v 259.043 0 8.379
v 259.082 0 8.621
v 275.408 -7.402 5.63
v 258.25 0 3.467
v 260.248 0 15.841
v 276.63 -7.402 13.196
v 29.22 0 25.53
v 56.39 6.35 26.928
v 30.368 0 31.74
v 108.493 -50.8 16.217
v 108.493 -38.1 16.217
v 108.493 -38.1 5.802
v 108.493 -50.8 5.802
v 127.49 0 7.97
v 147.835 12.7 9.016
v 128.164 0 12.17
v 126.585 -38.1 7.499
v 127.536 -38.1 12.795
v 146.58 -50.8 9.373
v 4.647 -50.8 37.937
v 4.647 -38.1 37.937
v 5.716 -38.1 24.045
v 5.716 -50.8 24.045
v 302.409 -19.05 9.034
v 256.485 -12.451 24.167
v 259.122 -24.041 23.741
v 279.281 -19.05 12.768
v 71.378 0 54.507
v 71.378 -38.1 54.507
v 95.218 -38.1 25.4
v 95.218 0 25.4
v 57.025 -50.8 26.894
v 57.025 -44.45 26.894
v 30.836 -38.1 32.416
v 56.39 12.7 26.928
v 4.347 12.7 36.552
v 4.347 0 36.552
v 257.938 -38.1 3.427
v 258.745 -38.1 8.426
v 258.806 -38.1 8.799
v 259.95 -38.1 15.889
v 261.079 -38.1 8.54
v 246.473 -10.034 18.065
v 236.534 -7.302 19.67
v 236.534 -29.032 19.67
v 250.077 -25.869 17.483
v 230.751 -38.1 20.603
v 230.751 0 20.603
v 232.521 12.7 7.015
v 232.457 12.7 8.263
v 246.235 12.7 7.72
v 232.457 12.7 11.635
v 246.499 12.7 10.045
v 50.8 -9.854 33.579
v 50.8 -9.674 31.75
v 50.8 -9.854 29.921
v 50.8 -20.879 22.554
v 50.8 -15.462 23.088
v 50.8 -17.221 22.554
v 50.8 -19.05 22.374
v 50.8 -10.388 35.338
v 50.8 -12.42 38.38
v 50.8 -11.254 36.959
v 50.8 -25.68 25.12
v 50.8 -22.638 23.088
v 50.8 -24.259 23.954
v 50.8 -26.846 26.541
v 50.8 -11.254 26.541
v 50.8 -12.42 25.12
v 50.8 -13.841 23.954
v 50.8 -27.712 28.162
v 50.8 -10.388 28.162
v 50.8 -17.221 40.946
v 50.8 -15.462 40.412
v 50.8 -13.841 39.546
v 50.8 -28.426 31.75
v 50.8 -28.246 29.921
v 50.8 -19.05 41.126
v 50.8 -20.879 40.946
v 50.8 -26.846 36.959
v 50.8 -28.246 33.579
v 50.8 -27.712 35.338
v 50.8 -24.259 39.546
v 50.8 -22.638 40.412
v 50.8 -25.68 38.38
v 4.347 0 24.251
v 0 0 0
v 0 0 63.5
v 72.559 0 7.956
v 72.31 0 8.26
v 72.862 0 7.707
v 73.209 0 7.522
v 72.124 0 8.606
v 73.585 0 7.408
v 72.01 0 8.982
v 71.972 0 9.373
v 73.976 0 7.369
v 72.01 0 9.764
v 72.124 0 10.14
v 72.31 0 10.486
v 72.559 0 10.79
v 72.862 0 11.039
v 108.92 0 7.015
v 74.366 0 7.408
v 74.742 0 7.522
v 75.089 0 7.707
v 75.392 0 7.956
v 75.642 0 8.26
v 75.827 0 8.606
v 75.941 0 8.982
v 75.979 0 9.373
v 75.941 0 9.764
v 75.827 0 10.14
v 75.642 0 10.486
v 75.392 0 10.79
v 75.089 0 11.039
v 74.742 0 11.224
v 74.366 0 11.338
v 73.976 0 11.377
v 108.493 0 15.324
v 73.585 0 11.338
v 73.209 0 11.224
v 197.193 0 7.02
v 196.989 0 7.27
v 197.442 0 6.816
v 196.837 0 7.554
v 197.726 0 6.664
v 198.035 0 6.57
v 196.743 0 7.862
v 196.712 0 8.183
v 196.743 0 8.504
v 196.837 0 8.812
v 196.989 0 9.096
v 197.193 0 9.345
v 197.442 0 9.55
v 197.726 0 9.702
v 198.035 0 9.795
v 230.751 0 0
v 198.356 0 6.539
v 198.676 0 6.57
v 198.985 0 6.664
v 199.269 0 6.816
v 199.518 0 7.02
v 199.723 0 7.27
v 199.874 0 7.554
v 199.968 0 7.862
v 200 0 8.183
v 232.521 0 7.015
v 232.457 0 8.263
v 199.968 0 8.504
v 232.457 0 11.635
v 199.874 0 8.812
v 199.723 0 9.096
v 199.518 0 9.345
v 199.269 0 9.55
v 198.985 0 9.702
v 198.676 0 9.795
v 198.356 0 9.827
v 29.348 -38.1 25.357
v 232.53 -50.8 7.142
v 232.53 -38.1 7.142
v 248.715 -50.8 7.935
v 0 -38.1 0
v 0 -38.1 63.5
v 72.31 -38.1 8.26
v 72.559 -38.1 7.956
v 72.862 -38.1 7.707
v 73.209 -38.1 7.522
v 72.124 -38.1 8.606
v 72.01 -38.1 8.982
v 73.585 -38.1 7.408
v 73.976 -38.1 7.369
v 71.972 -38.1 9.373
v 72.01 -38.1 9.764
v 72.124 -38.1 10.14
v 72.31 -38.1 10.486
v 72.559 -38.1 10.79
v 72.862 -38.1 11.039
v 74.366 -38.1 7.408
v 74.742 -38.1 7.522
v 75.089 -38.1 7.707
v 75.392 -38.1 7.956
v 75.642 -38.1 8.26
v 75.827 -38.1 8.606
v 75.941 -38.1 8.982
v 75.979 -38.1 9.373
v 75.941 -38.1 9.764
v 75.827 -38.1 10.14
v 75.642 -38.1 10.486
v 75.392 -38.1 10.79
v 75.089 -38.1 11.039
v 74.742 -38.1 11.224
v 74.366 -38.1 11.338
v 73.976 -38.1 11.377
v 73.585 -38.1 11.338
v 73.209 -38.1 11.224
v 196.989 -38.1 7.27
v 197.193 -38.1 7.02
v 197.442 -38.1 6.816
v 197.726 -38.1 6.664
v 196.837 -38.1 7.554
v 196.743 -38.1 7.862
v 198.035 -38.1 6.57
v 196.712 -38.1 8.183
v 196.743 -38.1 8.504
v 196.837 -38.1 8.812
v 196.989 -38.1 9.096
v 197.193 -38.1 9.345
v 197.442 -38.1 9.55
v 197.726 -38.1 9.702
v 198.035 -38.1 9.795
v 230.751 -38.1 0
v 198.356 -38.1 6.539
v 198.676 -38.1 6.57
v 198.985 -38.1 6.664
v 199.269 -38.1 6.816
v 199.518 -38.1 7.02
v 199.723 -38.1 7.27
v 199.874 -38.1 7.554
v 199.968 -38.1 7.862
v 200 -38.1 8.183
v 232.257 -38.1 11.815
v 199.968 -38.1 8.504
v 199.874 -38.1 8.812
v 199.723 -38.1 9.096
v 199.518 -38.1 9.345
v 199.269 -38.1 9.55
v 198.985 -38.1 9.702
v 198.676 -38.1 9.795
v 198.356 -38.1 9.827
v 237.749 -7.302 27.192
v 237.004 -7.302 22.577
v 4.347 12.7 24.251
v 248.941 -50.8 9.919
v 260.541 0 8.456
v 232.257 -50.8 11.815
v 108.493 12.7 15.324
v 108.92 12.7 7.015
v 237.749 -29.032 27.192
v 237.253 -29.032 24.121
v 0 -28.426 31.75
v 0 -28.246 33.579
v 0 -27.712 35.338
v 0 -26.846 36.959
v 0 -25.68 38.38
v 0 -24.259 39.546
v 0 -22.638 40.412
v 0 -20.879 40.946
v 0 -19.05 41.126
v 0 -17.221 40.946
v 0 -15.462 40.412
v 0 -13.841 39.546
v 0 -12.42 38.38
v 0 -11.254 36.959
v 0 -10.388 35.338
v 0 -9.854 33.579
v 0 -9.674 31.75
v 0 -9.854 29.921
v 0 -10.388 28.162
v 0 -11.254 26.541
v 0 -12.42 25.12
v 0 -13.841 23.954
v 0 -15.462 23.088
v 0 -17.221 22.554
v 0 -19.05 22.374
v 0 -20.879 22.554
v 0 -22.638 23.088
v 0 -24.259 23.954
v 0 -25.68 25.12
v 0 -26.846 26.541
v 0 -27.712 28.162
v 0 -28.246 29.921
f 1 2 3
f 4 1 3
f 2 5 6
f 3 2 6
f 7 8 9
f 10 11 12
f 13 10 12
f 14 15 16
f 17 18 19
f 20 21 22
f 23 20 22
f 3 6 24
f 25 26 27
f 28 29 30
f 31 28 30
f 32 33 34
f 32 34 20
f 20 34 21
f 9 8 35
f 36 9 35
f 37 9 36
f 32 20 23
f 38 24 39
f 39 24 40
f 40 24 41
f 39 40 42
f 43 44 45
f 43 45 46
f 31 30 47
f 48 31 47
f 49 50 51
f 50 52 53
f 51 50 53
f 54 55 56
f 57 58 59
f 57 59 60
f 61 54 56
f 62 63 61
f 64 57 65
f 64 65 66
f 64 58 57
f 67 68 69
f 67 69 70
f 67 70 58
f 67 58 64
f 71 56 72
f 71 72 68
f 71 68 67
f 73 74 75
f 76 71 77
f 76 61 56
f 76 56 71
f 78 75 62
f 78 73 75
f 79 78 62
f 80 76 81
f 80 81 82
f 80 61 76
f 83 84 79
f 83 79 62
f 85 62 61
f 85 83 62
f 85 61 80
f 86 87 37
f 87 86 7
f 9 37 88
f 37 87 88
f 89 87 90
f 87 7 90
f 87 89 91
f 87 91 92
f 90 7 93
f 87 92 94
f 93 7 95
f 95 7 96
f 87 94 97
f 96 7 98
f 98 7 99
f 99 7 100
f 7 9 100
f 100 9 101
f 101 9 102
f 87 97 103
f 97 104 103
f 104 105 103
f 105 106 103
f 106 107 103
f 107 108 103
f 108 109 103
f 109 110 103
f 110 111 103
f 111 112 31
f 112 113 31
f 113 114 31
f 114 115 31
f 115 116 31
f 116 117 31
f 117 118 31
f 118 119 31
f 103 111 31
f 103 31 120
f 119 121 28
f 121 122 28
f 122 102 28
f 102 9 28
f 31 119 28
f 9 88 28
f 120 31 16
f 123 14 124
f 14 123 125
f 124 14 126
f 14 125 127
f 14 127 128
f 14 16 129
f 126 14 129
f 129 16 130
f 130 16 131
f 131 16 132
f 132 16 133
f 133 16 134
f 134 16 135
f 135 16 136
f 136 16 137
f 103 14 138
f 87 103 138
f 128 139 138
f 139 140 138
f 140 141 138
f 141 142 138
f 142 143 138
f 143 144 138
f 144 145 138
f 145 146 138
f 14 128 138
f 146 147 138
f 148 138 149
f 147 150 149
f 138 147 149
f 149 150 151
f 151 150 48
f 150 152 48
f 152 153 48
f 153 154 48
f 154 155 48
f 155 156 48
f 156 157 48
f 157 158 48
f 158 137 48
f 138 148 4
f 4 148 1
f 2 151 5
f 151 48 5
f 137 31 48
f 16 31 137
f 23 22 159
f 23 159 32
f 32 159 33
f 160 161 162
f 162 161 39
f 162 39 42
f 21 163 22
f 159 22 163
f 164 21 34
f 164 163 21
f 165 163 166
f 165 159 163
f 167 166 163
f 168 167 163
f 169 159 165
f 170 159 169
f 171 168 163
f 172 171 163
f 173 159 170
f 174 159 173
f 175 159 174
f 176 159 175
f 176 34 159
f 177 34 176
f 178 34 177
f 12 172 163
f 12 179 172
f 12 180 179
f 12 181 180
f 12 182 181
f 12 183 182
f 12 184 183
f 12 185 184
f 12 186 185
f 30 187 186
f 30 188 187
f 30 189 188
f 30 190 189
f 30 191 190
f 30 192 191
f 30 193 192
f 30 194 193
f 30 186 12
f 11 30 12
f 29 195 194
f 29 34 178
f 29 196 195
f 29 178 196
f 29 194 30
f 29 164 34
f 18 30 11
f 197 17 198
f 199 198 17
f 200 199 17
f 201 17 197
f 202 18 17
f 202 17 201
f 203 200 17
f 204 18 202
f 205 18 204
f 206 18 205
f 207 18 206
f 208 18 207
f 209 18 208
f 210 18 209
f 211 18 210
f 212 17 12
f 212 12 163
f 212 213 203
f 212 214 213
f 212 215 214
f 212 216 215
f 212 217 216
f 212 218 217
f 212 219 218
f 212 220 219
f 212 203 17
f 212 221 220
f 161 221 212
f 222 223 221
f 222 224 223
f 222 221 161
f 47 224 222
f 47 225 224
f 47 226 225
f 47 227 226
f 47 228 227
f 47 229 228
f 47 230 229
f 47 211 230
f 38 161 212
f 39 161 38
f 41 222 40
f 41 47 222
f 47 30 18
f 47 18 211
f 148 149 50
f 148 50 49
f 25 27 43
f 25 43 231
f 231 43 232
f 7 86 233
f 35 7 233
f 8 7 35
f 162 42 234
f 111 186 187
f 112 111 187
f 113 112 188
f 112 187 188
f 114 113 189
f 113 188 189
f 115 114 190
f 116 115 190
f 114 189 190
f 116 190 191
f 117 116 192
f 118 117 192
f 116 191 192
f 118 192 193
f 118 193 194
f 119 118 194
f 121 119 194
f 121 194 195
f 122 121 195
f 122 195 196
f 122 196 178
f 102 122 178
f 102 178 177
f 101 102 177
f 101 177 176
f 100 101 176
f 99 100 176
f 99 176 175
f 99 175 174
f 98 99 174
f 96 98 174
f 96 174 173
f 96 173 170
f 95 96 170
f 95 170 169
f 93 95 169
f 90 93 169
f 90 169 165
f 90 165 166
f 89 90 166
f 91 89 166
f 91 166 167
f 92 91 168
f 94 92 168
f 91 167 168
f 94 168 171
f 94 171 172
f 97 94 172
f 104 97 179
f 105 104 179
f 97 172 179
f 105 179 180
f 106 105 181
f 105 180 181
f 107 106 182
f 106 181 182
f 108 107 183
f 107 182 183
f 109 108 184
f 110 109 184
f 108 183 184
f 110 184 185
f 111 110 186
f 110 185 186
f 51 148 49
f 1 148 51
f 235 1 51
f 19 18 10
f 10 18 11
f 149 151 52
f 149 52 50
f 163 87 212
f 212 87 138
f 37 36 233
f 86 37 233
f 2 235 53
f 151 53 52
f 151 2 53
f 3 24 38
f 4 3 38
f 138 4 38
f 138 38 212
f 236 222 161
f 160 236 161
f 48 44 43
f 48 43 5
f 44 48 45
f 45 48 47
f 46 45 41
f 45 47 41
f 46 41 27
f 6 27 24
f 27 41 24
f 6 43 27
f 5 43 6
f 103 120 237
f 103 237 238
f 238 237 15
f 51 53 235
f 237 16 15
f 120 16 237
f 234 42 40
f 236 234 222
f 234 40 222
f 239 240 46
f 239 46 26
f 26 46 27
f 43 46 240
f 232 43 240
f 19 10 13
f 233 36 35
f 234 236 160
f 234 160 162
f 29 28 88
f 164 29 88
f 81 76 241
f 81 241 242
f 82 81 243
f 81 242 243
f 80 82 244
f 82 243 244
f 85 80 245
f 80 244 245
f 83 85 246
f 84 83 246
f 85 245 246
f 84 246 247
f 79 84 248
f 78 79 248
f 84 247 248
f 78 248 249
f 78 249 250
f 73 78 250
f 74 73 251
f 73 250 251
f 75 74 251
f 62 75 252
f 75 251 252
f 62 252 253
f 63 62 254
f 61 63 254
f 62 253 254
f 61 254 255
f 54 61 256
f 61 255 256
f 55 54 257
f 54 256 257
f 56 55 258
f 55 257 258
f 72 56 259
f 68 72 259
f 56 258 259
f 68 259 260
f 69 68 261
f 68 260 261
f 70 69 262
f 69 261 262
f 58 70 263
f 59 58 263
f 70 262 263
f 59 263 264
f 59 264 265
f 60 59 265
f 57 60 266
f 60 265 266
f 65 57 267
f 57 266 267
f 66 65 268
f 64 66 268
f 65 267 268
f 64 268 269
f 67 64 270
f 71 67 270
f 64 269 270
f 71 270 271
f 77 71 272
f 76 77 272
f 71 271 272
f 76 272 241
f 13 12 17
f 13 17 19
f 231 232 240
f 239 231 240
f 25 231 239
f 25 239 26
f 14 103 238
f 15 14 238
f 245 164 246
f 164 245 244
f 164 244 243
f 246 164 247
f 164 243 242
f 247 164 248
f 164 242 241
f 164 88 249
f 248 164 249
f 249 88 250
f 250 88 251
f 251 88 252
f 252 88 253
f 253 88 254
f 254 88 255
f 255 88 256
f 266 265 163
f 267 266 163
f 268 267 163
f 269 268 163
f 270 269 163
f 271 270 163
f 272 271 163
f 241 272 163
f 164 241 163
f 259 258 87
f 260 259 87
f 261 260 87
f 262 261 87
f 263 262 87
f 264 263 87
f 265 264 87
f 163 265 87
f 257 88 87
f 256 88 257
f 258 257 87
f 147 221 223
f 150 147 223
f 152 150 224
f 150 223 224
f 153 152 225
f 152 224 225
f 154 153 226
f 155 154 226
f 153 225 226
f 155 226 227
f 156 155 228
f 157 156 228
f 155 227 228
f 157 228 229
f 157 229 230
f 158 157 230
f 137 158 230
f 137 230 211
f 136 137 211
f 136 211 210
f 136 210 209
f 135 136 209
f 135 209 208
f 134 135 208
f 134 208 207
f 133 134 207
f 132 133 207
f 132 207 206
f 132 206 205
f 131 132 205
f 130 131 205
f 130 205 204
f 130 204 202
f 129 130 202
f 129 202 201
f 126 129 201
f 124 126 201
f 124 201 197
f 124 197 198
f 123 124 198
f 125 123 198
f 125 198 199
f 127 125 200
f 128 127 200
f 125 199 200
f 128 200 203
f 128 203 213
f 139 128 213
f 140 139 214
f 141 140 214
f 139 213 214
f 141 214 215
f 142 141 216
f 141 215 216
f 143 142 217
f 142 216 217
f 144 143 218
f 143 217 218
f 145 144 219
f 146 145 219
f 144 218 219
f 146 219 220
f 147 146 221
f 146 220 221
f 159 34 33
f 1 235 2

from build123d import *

# Parameters (mm, degrees)
F1_DEPTH  = 38.1
F4_DEPTH  = 38.1
F6_DEPTH  = 38.1
F8_DEPTH  = 38.1
F11_DEPTH = 12.7
F13_DEPTH = 12.7
F15_DEPTH = 12.7
F17_DEPTH = 25.4
F19_DEPTH = 7.62
F21_DEPTH = 25.4
F23_DEPTH = 12.7
F25_DEPTH = 12.7
F26_DEPTH = 12.7
F28_DEPTH = 25.4
F30_DEPTH = 25.4
F32_DEPTH = 25.4
F34_DEPTH = 25.4
F36_DEPTH = 25.4
F38_DEPTH = 25.4
F2_R      = 9.3756609964
F39_DEPTH = 50.8
F41_DEPTH = 25.4
F43_DEPTH = 25.4
F44_R     = 1.6440489173
F44_R_2   = 2.0037736154
F45_DEPTH = 50.8


with BuildPart() as f1:
    # F0 (on Front) → F1 (new body)
    with BuildSketch(Plane.XZ):
        Polygon((0, 63.5), (0, 0), (302.4093748547, 0), (302.4093748547, 25.4), align=None)
    extrude(amount=F1_DEPTH)

    # F3 (on face) → F4 (cut)
    with BuildSketch(Plane.XZ.offset(38.1)):
        Polygon((302.4093748547, 25.4), (71.378469884, 54.507158082), (95.2177494764, 25.4), (302.4093748547, 18.0674288422), align=None)
    extrude(amount=-F4_DEPTH, mode=Mode.SUBTRACT)

    # F5 (on face) → F6 (cut)
    with BuildSketch(Plane.XZ.offset(38.1)):
        Polygon((230.7509960012, 20.6034394606), (302.4093748547, 9.0337144211), (302.4093748547, 18.0674288422), align=None)
    extrude(amount=-F6_DEPTH, mode=Mode.SUBTRACT)

    # F7 (on face) → F8 (cut)
    with BuildSketch(Plane.XZ.offset(38.1)):
        Polygon((302.4093748547, 0), (302.4093748547, 9.0337144211), (230.7509960012, 0), align=None)
    extrude(amount=-F8_DEPTH, mode=Mode.SUBTRACT)

    # F10 (on face) → F11 (join)
    with BuildSketch(Plane.XZ.offset(38.1)):
        Polygon((57.0245832205, 26.8944967538), (4.6469587833, 37.9372723401), (5.7158898562, 24.0447483957), align=None)
    extrude(amount=F11_DEPTH)

    # F12 (on face) → F13 (join)
    with BuildSketch(Plane.XZ.offset(38.1)):
        Polygon((146.5801596642, 9.3731330708), (108.4925159812, 16.2170082331), (108.4925159812, 5.8024153113), align=None)
    extrude(amount=F13_DEPTH)

    # F14 (on face) → F15 (join)
    with BuildSketch(Plane.XZ.offset(38.1)):
        Polygon((261.0786855221, 8.5403770208), (232.2574704885, 11.8147395551), (232.5303256512, 7.1419519372), align=None)
    extrude(amount=F15_DEPTH)

    # F16 (on face) → F17 (cut)
    with BuildSketch(Plane(origin=(6.216250911, 0, 34.5947791457), x_dir=(0.9842368971, 0, -0.1768551111), z_dir=(0.1768551111, 0, 0.9842368971))):
        Polygon((123.2630957695, -38.1), (142.6119150394, -50.8), (142.6119150394, -38.1), align=None)
    extrude(amount=-F17_DEPTH, mode=Mode.SUBTRACT)

    # F18 (on face) → F19 (join)
    with BuildSketch(Plane(origin=(9.1045026508, 0, 56.3897497994), x_dir=(0.9872152882, 0, -0.159392518), z_dir=(0.159392518, 0, 0.9872152882))):
        Polygon((273.6749947071, -19.05), (230.3751856089, -7.3024798185), (230.3751856089, -29.0318094194), align=None)
    extrude(amount=F19_DEPTH)

    # F20 (on face) → F21 (cut)
    with BuildSketch(Plane(origin=(17.7501025045, -77.9948093822, -2.8658728914), x_dir=(0.9751003181, 0.2216146645, 0.0081430991), z_dir=(0.2217642207, -0.9744427175, -0.0358053182))):
        Polygon((238.2592436798, 18.4212918256), (225.1080880547, 25.1705576425), (224.3710737528, 20.7224409643), align=None)
    extrude(amount=-F21_DEPTH, mode=Mode.SUBTRACT)

    # F22 (on face) → F23 (join)
    with BuildSketch(Plane.XZ):
        Polygon((56.3897466524, 26.9276275739), (4.3465946801, 36.552254676), (4.3465946801, 24.2511220276), align=None)
    extrude(amount=-F23_DEPTH)

    # F24 (on face) → F25 (join)
    with BuildSketch(Plane.XZ):
        Polygon((232.4568778276, 11.635161005), (232.4568778276, 8.2633461603), (232.5210973665, 7.0146331797), (260.5405604993, 8.4556344572), align=None)
    extrude(amount=-F25_DEPTH)

    # F9 (on Front) → F26 (join)
    with BuildSketch(Plane.XZ):
        Polygon((147.8346826, 9.0159667453), (108.4925159812, 15.3243280947), (108.9198718135, 7.0146331797), align=None)
    extrude(amount=-F26_DEPTH)

    # F27 (on face) → F28 (cut)
    with BuildSketch(Plane(origin=(5.115117276, 0, 31.900486513), x_dir=(0.9873872694, 0, -0.1583236568), z_dir=(0.1583236568, 0, 0.9873872694))):
        Polygon((144.5426427436, 12.7), (124.6202840907, 0), (144.5426427436, 0), align=None)
    extrude(amount=-F28_DEPTH, mode=Mode.SUBTRACT)

    # F29 (on face) → F30 (cut)
    with BuildSketch(Plane(origin=(4.2425164902, 0, 37.4727133277), x_dir=(0.9936520123, 0, -0.1124974594), z_dir=(0.1124974594, 0, 0.9936520123))):
        Polygon((257.9354148407, 12.7), (243.803866611, 12.7), (257.9354148407, 0), align=None)
    extrude(amount=-F30_DEPTH, mode=Mode.SUBTRACT)

    # F31 (on face) → F32 (cut)
    with BuildSketch(Plane(origin=(4.2847349057, 0, 37.7145978145), x_dir=(0.993608254, 0, -0.1128832923), z_dir=(0.1128832923, 0, 0.993608254))):
        Polygon((258.4458709906, -50.8), (258.4458709906, -38.1), (246.229827404, -50.8), align=None)
    extrude(amount=-F32_DEPTH, mode=Mode.SUBTRACT)

    # F33 (on face) → F34 (cut)
    with BuildSketch(Plane(origin=(17.7501025045, -77.9948093822, -2.8658728914), x_dir=(0.9751003181, 0.2216146645, 0.0081430991), z_dir=(0.2217642207, -0.9744427175, -0.0358053182))):
        Polygon((269.454439727, 20.9764088194), (247.5355495769, 24.6081785526), (268.208854053, 13.4589014978), align=None)
    extrude(amount=-F34_DEPTH, mode=Mode.SUBTRACT)

    # F35 (on face) → F36 (cut)
    with BuildSketch(Plane(origin=(7.8556900223, 0, 37.2607754701), x_dir=(0.9784898364, 0, -0.2062950314), z_dir=(0.2062950314, 0, 0.9784898364))):
        Polygon((23.4852526042, -38.1), (50.2497740567, -44.45), (50.2497740567, -38.1), align=None)
    extrude(amount=-F36_DEPTH, mode=Mode.SUBTRACT)

    # F37 (on face) → F38 (cut)
    with BuildSketch(Plane(origin=(6.6800047408, 0, 36.1207242852), x_dir=(0.9833259332, 0, -0.1818518877), z_dir=(0.1818518877, 0, 0.9833259332))):
        Polygon((50.552660346, 0), (50.552660346, 6.35), (24.0898415521, 0), align=None)
    extrude(amount=-F38_DEPTH, mode=Mode.SUBTRACT)

    # F2 (on face) → F39 (cut)
    with BuildSketch(Plane(origin=(0, 0, 0), x_dir=(0, -1, 0), z_dir=(-1, 0, 0))):
        with Locations((19.05, 31.75)):
            Circle(F2_R)
    extrude(amount=-F39_DEPTH, mode=Mode.SUBTRACT)

    # F40 (on face) → F41 (cut)
    with BuildSketch(Plane(origin=(9.1045026508, 0, 56.3897497994), x_dir=(0.9872152882, 0, -0.159392518), z_dir=(0.159392518, 0, 0.9872152882))):
        Polygon((269.2834402546, 0), (254.3958723545, 0), (270.9897734825, -7.4018547064), align=None)
        Polygon((269.2834402546, 0), (270.9897734825, -7.4018547064), (297.1032516572, -19.05), (297.1032516572, 0), align=None)
    extrude(amount=-F41_DEPTH, mode=Mode.SUBTRACT)

    # F42 (on face) → F43 (cut)
    with BuildSketch(Plane(origin=(9.1045026508, 0, 56.3897497994), x_dir=(0.9872152882, 0, -0.159392518), z_dir=(0.159392518, 0, 0.9872152882))):
        Polygon((297.1032516572, -38.1), (297.1032516572, -19.05), (254.0944516659, -38.1), align=None)
    extrude(amount=-F43_DEPTH, mode=Mode.SUBTRACT)

    # F44 (on face) → F45 (cut)
    with BuildSketch(Plane.XZ.offset(38.1)):
        with Locations((198.3555555344, 8.1828935072)):
            Circle(F44_R)
        with Locations((73.9755779505, 9.3731330708)):
            Circle(F44_R_2)
    extrude(amount=-F45_DEPTH, mode=Mode.SUBTRACT)


solid = f1.part
